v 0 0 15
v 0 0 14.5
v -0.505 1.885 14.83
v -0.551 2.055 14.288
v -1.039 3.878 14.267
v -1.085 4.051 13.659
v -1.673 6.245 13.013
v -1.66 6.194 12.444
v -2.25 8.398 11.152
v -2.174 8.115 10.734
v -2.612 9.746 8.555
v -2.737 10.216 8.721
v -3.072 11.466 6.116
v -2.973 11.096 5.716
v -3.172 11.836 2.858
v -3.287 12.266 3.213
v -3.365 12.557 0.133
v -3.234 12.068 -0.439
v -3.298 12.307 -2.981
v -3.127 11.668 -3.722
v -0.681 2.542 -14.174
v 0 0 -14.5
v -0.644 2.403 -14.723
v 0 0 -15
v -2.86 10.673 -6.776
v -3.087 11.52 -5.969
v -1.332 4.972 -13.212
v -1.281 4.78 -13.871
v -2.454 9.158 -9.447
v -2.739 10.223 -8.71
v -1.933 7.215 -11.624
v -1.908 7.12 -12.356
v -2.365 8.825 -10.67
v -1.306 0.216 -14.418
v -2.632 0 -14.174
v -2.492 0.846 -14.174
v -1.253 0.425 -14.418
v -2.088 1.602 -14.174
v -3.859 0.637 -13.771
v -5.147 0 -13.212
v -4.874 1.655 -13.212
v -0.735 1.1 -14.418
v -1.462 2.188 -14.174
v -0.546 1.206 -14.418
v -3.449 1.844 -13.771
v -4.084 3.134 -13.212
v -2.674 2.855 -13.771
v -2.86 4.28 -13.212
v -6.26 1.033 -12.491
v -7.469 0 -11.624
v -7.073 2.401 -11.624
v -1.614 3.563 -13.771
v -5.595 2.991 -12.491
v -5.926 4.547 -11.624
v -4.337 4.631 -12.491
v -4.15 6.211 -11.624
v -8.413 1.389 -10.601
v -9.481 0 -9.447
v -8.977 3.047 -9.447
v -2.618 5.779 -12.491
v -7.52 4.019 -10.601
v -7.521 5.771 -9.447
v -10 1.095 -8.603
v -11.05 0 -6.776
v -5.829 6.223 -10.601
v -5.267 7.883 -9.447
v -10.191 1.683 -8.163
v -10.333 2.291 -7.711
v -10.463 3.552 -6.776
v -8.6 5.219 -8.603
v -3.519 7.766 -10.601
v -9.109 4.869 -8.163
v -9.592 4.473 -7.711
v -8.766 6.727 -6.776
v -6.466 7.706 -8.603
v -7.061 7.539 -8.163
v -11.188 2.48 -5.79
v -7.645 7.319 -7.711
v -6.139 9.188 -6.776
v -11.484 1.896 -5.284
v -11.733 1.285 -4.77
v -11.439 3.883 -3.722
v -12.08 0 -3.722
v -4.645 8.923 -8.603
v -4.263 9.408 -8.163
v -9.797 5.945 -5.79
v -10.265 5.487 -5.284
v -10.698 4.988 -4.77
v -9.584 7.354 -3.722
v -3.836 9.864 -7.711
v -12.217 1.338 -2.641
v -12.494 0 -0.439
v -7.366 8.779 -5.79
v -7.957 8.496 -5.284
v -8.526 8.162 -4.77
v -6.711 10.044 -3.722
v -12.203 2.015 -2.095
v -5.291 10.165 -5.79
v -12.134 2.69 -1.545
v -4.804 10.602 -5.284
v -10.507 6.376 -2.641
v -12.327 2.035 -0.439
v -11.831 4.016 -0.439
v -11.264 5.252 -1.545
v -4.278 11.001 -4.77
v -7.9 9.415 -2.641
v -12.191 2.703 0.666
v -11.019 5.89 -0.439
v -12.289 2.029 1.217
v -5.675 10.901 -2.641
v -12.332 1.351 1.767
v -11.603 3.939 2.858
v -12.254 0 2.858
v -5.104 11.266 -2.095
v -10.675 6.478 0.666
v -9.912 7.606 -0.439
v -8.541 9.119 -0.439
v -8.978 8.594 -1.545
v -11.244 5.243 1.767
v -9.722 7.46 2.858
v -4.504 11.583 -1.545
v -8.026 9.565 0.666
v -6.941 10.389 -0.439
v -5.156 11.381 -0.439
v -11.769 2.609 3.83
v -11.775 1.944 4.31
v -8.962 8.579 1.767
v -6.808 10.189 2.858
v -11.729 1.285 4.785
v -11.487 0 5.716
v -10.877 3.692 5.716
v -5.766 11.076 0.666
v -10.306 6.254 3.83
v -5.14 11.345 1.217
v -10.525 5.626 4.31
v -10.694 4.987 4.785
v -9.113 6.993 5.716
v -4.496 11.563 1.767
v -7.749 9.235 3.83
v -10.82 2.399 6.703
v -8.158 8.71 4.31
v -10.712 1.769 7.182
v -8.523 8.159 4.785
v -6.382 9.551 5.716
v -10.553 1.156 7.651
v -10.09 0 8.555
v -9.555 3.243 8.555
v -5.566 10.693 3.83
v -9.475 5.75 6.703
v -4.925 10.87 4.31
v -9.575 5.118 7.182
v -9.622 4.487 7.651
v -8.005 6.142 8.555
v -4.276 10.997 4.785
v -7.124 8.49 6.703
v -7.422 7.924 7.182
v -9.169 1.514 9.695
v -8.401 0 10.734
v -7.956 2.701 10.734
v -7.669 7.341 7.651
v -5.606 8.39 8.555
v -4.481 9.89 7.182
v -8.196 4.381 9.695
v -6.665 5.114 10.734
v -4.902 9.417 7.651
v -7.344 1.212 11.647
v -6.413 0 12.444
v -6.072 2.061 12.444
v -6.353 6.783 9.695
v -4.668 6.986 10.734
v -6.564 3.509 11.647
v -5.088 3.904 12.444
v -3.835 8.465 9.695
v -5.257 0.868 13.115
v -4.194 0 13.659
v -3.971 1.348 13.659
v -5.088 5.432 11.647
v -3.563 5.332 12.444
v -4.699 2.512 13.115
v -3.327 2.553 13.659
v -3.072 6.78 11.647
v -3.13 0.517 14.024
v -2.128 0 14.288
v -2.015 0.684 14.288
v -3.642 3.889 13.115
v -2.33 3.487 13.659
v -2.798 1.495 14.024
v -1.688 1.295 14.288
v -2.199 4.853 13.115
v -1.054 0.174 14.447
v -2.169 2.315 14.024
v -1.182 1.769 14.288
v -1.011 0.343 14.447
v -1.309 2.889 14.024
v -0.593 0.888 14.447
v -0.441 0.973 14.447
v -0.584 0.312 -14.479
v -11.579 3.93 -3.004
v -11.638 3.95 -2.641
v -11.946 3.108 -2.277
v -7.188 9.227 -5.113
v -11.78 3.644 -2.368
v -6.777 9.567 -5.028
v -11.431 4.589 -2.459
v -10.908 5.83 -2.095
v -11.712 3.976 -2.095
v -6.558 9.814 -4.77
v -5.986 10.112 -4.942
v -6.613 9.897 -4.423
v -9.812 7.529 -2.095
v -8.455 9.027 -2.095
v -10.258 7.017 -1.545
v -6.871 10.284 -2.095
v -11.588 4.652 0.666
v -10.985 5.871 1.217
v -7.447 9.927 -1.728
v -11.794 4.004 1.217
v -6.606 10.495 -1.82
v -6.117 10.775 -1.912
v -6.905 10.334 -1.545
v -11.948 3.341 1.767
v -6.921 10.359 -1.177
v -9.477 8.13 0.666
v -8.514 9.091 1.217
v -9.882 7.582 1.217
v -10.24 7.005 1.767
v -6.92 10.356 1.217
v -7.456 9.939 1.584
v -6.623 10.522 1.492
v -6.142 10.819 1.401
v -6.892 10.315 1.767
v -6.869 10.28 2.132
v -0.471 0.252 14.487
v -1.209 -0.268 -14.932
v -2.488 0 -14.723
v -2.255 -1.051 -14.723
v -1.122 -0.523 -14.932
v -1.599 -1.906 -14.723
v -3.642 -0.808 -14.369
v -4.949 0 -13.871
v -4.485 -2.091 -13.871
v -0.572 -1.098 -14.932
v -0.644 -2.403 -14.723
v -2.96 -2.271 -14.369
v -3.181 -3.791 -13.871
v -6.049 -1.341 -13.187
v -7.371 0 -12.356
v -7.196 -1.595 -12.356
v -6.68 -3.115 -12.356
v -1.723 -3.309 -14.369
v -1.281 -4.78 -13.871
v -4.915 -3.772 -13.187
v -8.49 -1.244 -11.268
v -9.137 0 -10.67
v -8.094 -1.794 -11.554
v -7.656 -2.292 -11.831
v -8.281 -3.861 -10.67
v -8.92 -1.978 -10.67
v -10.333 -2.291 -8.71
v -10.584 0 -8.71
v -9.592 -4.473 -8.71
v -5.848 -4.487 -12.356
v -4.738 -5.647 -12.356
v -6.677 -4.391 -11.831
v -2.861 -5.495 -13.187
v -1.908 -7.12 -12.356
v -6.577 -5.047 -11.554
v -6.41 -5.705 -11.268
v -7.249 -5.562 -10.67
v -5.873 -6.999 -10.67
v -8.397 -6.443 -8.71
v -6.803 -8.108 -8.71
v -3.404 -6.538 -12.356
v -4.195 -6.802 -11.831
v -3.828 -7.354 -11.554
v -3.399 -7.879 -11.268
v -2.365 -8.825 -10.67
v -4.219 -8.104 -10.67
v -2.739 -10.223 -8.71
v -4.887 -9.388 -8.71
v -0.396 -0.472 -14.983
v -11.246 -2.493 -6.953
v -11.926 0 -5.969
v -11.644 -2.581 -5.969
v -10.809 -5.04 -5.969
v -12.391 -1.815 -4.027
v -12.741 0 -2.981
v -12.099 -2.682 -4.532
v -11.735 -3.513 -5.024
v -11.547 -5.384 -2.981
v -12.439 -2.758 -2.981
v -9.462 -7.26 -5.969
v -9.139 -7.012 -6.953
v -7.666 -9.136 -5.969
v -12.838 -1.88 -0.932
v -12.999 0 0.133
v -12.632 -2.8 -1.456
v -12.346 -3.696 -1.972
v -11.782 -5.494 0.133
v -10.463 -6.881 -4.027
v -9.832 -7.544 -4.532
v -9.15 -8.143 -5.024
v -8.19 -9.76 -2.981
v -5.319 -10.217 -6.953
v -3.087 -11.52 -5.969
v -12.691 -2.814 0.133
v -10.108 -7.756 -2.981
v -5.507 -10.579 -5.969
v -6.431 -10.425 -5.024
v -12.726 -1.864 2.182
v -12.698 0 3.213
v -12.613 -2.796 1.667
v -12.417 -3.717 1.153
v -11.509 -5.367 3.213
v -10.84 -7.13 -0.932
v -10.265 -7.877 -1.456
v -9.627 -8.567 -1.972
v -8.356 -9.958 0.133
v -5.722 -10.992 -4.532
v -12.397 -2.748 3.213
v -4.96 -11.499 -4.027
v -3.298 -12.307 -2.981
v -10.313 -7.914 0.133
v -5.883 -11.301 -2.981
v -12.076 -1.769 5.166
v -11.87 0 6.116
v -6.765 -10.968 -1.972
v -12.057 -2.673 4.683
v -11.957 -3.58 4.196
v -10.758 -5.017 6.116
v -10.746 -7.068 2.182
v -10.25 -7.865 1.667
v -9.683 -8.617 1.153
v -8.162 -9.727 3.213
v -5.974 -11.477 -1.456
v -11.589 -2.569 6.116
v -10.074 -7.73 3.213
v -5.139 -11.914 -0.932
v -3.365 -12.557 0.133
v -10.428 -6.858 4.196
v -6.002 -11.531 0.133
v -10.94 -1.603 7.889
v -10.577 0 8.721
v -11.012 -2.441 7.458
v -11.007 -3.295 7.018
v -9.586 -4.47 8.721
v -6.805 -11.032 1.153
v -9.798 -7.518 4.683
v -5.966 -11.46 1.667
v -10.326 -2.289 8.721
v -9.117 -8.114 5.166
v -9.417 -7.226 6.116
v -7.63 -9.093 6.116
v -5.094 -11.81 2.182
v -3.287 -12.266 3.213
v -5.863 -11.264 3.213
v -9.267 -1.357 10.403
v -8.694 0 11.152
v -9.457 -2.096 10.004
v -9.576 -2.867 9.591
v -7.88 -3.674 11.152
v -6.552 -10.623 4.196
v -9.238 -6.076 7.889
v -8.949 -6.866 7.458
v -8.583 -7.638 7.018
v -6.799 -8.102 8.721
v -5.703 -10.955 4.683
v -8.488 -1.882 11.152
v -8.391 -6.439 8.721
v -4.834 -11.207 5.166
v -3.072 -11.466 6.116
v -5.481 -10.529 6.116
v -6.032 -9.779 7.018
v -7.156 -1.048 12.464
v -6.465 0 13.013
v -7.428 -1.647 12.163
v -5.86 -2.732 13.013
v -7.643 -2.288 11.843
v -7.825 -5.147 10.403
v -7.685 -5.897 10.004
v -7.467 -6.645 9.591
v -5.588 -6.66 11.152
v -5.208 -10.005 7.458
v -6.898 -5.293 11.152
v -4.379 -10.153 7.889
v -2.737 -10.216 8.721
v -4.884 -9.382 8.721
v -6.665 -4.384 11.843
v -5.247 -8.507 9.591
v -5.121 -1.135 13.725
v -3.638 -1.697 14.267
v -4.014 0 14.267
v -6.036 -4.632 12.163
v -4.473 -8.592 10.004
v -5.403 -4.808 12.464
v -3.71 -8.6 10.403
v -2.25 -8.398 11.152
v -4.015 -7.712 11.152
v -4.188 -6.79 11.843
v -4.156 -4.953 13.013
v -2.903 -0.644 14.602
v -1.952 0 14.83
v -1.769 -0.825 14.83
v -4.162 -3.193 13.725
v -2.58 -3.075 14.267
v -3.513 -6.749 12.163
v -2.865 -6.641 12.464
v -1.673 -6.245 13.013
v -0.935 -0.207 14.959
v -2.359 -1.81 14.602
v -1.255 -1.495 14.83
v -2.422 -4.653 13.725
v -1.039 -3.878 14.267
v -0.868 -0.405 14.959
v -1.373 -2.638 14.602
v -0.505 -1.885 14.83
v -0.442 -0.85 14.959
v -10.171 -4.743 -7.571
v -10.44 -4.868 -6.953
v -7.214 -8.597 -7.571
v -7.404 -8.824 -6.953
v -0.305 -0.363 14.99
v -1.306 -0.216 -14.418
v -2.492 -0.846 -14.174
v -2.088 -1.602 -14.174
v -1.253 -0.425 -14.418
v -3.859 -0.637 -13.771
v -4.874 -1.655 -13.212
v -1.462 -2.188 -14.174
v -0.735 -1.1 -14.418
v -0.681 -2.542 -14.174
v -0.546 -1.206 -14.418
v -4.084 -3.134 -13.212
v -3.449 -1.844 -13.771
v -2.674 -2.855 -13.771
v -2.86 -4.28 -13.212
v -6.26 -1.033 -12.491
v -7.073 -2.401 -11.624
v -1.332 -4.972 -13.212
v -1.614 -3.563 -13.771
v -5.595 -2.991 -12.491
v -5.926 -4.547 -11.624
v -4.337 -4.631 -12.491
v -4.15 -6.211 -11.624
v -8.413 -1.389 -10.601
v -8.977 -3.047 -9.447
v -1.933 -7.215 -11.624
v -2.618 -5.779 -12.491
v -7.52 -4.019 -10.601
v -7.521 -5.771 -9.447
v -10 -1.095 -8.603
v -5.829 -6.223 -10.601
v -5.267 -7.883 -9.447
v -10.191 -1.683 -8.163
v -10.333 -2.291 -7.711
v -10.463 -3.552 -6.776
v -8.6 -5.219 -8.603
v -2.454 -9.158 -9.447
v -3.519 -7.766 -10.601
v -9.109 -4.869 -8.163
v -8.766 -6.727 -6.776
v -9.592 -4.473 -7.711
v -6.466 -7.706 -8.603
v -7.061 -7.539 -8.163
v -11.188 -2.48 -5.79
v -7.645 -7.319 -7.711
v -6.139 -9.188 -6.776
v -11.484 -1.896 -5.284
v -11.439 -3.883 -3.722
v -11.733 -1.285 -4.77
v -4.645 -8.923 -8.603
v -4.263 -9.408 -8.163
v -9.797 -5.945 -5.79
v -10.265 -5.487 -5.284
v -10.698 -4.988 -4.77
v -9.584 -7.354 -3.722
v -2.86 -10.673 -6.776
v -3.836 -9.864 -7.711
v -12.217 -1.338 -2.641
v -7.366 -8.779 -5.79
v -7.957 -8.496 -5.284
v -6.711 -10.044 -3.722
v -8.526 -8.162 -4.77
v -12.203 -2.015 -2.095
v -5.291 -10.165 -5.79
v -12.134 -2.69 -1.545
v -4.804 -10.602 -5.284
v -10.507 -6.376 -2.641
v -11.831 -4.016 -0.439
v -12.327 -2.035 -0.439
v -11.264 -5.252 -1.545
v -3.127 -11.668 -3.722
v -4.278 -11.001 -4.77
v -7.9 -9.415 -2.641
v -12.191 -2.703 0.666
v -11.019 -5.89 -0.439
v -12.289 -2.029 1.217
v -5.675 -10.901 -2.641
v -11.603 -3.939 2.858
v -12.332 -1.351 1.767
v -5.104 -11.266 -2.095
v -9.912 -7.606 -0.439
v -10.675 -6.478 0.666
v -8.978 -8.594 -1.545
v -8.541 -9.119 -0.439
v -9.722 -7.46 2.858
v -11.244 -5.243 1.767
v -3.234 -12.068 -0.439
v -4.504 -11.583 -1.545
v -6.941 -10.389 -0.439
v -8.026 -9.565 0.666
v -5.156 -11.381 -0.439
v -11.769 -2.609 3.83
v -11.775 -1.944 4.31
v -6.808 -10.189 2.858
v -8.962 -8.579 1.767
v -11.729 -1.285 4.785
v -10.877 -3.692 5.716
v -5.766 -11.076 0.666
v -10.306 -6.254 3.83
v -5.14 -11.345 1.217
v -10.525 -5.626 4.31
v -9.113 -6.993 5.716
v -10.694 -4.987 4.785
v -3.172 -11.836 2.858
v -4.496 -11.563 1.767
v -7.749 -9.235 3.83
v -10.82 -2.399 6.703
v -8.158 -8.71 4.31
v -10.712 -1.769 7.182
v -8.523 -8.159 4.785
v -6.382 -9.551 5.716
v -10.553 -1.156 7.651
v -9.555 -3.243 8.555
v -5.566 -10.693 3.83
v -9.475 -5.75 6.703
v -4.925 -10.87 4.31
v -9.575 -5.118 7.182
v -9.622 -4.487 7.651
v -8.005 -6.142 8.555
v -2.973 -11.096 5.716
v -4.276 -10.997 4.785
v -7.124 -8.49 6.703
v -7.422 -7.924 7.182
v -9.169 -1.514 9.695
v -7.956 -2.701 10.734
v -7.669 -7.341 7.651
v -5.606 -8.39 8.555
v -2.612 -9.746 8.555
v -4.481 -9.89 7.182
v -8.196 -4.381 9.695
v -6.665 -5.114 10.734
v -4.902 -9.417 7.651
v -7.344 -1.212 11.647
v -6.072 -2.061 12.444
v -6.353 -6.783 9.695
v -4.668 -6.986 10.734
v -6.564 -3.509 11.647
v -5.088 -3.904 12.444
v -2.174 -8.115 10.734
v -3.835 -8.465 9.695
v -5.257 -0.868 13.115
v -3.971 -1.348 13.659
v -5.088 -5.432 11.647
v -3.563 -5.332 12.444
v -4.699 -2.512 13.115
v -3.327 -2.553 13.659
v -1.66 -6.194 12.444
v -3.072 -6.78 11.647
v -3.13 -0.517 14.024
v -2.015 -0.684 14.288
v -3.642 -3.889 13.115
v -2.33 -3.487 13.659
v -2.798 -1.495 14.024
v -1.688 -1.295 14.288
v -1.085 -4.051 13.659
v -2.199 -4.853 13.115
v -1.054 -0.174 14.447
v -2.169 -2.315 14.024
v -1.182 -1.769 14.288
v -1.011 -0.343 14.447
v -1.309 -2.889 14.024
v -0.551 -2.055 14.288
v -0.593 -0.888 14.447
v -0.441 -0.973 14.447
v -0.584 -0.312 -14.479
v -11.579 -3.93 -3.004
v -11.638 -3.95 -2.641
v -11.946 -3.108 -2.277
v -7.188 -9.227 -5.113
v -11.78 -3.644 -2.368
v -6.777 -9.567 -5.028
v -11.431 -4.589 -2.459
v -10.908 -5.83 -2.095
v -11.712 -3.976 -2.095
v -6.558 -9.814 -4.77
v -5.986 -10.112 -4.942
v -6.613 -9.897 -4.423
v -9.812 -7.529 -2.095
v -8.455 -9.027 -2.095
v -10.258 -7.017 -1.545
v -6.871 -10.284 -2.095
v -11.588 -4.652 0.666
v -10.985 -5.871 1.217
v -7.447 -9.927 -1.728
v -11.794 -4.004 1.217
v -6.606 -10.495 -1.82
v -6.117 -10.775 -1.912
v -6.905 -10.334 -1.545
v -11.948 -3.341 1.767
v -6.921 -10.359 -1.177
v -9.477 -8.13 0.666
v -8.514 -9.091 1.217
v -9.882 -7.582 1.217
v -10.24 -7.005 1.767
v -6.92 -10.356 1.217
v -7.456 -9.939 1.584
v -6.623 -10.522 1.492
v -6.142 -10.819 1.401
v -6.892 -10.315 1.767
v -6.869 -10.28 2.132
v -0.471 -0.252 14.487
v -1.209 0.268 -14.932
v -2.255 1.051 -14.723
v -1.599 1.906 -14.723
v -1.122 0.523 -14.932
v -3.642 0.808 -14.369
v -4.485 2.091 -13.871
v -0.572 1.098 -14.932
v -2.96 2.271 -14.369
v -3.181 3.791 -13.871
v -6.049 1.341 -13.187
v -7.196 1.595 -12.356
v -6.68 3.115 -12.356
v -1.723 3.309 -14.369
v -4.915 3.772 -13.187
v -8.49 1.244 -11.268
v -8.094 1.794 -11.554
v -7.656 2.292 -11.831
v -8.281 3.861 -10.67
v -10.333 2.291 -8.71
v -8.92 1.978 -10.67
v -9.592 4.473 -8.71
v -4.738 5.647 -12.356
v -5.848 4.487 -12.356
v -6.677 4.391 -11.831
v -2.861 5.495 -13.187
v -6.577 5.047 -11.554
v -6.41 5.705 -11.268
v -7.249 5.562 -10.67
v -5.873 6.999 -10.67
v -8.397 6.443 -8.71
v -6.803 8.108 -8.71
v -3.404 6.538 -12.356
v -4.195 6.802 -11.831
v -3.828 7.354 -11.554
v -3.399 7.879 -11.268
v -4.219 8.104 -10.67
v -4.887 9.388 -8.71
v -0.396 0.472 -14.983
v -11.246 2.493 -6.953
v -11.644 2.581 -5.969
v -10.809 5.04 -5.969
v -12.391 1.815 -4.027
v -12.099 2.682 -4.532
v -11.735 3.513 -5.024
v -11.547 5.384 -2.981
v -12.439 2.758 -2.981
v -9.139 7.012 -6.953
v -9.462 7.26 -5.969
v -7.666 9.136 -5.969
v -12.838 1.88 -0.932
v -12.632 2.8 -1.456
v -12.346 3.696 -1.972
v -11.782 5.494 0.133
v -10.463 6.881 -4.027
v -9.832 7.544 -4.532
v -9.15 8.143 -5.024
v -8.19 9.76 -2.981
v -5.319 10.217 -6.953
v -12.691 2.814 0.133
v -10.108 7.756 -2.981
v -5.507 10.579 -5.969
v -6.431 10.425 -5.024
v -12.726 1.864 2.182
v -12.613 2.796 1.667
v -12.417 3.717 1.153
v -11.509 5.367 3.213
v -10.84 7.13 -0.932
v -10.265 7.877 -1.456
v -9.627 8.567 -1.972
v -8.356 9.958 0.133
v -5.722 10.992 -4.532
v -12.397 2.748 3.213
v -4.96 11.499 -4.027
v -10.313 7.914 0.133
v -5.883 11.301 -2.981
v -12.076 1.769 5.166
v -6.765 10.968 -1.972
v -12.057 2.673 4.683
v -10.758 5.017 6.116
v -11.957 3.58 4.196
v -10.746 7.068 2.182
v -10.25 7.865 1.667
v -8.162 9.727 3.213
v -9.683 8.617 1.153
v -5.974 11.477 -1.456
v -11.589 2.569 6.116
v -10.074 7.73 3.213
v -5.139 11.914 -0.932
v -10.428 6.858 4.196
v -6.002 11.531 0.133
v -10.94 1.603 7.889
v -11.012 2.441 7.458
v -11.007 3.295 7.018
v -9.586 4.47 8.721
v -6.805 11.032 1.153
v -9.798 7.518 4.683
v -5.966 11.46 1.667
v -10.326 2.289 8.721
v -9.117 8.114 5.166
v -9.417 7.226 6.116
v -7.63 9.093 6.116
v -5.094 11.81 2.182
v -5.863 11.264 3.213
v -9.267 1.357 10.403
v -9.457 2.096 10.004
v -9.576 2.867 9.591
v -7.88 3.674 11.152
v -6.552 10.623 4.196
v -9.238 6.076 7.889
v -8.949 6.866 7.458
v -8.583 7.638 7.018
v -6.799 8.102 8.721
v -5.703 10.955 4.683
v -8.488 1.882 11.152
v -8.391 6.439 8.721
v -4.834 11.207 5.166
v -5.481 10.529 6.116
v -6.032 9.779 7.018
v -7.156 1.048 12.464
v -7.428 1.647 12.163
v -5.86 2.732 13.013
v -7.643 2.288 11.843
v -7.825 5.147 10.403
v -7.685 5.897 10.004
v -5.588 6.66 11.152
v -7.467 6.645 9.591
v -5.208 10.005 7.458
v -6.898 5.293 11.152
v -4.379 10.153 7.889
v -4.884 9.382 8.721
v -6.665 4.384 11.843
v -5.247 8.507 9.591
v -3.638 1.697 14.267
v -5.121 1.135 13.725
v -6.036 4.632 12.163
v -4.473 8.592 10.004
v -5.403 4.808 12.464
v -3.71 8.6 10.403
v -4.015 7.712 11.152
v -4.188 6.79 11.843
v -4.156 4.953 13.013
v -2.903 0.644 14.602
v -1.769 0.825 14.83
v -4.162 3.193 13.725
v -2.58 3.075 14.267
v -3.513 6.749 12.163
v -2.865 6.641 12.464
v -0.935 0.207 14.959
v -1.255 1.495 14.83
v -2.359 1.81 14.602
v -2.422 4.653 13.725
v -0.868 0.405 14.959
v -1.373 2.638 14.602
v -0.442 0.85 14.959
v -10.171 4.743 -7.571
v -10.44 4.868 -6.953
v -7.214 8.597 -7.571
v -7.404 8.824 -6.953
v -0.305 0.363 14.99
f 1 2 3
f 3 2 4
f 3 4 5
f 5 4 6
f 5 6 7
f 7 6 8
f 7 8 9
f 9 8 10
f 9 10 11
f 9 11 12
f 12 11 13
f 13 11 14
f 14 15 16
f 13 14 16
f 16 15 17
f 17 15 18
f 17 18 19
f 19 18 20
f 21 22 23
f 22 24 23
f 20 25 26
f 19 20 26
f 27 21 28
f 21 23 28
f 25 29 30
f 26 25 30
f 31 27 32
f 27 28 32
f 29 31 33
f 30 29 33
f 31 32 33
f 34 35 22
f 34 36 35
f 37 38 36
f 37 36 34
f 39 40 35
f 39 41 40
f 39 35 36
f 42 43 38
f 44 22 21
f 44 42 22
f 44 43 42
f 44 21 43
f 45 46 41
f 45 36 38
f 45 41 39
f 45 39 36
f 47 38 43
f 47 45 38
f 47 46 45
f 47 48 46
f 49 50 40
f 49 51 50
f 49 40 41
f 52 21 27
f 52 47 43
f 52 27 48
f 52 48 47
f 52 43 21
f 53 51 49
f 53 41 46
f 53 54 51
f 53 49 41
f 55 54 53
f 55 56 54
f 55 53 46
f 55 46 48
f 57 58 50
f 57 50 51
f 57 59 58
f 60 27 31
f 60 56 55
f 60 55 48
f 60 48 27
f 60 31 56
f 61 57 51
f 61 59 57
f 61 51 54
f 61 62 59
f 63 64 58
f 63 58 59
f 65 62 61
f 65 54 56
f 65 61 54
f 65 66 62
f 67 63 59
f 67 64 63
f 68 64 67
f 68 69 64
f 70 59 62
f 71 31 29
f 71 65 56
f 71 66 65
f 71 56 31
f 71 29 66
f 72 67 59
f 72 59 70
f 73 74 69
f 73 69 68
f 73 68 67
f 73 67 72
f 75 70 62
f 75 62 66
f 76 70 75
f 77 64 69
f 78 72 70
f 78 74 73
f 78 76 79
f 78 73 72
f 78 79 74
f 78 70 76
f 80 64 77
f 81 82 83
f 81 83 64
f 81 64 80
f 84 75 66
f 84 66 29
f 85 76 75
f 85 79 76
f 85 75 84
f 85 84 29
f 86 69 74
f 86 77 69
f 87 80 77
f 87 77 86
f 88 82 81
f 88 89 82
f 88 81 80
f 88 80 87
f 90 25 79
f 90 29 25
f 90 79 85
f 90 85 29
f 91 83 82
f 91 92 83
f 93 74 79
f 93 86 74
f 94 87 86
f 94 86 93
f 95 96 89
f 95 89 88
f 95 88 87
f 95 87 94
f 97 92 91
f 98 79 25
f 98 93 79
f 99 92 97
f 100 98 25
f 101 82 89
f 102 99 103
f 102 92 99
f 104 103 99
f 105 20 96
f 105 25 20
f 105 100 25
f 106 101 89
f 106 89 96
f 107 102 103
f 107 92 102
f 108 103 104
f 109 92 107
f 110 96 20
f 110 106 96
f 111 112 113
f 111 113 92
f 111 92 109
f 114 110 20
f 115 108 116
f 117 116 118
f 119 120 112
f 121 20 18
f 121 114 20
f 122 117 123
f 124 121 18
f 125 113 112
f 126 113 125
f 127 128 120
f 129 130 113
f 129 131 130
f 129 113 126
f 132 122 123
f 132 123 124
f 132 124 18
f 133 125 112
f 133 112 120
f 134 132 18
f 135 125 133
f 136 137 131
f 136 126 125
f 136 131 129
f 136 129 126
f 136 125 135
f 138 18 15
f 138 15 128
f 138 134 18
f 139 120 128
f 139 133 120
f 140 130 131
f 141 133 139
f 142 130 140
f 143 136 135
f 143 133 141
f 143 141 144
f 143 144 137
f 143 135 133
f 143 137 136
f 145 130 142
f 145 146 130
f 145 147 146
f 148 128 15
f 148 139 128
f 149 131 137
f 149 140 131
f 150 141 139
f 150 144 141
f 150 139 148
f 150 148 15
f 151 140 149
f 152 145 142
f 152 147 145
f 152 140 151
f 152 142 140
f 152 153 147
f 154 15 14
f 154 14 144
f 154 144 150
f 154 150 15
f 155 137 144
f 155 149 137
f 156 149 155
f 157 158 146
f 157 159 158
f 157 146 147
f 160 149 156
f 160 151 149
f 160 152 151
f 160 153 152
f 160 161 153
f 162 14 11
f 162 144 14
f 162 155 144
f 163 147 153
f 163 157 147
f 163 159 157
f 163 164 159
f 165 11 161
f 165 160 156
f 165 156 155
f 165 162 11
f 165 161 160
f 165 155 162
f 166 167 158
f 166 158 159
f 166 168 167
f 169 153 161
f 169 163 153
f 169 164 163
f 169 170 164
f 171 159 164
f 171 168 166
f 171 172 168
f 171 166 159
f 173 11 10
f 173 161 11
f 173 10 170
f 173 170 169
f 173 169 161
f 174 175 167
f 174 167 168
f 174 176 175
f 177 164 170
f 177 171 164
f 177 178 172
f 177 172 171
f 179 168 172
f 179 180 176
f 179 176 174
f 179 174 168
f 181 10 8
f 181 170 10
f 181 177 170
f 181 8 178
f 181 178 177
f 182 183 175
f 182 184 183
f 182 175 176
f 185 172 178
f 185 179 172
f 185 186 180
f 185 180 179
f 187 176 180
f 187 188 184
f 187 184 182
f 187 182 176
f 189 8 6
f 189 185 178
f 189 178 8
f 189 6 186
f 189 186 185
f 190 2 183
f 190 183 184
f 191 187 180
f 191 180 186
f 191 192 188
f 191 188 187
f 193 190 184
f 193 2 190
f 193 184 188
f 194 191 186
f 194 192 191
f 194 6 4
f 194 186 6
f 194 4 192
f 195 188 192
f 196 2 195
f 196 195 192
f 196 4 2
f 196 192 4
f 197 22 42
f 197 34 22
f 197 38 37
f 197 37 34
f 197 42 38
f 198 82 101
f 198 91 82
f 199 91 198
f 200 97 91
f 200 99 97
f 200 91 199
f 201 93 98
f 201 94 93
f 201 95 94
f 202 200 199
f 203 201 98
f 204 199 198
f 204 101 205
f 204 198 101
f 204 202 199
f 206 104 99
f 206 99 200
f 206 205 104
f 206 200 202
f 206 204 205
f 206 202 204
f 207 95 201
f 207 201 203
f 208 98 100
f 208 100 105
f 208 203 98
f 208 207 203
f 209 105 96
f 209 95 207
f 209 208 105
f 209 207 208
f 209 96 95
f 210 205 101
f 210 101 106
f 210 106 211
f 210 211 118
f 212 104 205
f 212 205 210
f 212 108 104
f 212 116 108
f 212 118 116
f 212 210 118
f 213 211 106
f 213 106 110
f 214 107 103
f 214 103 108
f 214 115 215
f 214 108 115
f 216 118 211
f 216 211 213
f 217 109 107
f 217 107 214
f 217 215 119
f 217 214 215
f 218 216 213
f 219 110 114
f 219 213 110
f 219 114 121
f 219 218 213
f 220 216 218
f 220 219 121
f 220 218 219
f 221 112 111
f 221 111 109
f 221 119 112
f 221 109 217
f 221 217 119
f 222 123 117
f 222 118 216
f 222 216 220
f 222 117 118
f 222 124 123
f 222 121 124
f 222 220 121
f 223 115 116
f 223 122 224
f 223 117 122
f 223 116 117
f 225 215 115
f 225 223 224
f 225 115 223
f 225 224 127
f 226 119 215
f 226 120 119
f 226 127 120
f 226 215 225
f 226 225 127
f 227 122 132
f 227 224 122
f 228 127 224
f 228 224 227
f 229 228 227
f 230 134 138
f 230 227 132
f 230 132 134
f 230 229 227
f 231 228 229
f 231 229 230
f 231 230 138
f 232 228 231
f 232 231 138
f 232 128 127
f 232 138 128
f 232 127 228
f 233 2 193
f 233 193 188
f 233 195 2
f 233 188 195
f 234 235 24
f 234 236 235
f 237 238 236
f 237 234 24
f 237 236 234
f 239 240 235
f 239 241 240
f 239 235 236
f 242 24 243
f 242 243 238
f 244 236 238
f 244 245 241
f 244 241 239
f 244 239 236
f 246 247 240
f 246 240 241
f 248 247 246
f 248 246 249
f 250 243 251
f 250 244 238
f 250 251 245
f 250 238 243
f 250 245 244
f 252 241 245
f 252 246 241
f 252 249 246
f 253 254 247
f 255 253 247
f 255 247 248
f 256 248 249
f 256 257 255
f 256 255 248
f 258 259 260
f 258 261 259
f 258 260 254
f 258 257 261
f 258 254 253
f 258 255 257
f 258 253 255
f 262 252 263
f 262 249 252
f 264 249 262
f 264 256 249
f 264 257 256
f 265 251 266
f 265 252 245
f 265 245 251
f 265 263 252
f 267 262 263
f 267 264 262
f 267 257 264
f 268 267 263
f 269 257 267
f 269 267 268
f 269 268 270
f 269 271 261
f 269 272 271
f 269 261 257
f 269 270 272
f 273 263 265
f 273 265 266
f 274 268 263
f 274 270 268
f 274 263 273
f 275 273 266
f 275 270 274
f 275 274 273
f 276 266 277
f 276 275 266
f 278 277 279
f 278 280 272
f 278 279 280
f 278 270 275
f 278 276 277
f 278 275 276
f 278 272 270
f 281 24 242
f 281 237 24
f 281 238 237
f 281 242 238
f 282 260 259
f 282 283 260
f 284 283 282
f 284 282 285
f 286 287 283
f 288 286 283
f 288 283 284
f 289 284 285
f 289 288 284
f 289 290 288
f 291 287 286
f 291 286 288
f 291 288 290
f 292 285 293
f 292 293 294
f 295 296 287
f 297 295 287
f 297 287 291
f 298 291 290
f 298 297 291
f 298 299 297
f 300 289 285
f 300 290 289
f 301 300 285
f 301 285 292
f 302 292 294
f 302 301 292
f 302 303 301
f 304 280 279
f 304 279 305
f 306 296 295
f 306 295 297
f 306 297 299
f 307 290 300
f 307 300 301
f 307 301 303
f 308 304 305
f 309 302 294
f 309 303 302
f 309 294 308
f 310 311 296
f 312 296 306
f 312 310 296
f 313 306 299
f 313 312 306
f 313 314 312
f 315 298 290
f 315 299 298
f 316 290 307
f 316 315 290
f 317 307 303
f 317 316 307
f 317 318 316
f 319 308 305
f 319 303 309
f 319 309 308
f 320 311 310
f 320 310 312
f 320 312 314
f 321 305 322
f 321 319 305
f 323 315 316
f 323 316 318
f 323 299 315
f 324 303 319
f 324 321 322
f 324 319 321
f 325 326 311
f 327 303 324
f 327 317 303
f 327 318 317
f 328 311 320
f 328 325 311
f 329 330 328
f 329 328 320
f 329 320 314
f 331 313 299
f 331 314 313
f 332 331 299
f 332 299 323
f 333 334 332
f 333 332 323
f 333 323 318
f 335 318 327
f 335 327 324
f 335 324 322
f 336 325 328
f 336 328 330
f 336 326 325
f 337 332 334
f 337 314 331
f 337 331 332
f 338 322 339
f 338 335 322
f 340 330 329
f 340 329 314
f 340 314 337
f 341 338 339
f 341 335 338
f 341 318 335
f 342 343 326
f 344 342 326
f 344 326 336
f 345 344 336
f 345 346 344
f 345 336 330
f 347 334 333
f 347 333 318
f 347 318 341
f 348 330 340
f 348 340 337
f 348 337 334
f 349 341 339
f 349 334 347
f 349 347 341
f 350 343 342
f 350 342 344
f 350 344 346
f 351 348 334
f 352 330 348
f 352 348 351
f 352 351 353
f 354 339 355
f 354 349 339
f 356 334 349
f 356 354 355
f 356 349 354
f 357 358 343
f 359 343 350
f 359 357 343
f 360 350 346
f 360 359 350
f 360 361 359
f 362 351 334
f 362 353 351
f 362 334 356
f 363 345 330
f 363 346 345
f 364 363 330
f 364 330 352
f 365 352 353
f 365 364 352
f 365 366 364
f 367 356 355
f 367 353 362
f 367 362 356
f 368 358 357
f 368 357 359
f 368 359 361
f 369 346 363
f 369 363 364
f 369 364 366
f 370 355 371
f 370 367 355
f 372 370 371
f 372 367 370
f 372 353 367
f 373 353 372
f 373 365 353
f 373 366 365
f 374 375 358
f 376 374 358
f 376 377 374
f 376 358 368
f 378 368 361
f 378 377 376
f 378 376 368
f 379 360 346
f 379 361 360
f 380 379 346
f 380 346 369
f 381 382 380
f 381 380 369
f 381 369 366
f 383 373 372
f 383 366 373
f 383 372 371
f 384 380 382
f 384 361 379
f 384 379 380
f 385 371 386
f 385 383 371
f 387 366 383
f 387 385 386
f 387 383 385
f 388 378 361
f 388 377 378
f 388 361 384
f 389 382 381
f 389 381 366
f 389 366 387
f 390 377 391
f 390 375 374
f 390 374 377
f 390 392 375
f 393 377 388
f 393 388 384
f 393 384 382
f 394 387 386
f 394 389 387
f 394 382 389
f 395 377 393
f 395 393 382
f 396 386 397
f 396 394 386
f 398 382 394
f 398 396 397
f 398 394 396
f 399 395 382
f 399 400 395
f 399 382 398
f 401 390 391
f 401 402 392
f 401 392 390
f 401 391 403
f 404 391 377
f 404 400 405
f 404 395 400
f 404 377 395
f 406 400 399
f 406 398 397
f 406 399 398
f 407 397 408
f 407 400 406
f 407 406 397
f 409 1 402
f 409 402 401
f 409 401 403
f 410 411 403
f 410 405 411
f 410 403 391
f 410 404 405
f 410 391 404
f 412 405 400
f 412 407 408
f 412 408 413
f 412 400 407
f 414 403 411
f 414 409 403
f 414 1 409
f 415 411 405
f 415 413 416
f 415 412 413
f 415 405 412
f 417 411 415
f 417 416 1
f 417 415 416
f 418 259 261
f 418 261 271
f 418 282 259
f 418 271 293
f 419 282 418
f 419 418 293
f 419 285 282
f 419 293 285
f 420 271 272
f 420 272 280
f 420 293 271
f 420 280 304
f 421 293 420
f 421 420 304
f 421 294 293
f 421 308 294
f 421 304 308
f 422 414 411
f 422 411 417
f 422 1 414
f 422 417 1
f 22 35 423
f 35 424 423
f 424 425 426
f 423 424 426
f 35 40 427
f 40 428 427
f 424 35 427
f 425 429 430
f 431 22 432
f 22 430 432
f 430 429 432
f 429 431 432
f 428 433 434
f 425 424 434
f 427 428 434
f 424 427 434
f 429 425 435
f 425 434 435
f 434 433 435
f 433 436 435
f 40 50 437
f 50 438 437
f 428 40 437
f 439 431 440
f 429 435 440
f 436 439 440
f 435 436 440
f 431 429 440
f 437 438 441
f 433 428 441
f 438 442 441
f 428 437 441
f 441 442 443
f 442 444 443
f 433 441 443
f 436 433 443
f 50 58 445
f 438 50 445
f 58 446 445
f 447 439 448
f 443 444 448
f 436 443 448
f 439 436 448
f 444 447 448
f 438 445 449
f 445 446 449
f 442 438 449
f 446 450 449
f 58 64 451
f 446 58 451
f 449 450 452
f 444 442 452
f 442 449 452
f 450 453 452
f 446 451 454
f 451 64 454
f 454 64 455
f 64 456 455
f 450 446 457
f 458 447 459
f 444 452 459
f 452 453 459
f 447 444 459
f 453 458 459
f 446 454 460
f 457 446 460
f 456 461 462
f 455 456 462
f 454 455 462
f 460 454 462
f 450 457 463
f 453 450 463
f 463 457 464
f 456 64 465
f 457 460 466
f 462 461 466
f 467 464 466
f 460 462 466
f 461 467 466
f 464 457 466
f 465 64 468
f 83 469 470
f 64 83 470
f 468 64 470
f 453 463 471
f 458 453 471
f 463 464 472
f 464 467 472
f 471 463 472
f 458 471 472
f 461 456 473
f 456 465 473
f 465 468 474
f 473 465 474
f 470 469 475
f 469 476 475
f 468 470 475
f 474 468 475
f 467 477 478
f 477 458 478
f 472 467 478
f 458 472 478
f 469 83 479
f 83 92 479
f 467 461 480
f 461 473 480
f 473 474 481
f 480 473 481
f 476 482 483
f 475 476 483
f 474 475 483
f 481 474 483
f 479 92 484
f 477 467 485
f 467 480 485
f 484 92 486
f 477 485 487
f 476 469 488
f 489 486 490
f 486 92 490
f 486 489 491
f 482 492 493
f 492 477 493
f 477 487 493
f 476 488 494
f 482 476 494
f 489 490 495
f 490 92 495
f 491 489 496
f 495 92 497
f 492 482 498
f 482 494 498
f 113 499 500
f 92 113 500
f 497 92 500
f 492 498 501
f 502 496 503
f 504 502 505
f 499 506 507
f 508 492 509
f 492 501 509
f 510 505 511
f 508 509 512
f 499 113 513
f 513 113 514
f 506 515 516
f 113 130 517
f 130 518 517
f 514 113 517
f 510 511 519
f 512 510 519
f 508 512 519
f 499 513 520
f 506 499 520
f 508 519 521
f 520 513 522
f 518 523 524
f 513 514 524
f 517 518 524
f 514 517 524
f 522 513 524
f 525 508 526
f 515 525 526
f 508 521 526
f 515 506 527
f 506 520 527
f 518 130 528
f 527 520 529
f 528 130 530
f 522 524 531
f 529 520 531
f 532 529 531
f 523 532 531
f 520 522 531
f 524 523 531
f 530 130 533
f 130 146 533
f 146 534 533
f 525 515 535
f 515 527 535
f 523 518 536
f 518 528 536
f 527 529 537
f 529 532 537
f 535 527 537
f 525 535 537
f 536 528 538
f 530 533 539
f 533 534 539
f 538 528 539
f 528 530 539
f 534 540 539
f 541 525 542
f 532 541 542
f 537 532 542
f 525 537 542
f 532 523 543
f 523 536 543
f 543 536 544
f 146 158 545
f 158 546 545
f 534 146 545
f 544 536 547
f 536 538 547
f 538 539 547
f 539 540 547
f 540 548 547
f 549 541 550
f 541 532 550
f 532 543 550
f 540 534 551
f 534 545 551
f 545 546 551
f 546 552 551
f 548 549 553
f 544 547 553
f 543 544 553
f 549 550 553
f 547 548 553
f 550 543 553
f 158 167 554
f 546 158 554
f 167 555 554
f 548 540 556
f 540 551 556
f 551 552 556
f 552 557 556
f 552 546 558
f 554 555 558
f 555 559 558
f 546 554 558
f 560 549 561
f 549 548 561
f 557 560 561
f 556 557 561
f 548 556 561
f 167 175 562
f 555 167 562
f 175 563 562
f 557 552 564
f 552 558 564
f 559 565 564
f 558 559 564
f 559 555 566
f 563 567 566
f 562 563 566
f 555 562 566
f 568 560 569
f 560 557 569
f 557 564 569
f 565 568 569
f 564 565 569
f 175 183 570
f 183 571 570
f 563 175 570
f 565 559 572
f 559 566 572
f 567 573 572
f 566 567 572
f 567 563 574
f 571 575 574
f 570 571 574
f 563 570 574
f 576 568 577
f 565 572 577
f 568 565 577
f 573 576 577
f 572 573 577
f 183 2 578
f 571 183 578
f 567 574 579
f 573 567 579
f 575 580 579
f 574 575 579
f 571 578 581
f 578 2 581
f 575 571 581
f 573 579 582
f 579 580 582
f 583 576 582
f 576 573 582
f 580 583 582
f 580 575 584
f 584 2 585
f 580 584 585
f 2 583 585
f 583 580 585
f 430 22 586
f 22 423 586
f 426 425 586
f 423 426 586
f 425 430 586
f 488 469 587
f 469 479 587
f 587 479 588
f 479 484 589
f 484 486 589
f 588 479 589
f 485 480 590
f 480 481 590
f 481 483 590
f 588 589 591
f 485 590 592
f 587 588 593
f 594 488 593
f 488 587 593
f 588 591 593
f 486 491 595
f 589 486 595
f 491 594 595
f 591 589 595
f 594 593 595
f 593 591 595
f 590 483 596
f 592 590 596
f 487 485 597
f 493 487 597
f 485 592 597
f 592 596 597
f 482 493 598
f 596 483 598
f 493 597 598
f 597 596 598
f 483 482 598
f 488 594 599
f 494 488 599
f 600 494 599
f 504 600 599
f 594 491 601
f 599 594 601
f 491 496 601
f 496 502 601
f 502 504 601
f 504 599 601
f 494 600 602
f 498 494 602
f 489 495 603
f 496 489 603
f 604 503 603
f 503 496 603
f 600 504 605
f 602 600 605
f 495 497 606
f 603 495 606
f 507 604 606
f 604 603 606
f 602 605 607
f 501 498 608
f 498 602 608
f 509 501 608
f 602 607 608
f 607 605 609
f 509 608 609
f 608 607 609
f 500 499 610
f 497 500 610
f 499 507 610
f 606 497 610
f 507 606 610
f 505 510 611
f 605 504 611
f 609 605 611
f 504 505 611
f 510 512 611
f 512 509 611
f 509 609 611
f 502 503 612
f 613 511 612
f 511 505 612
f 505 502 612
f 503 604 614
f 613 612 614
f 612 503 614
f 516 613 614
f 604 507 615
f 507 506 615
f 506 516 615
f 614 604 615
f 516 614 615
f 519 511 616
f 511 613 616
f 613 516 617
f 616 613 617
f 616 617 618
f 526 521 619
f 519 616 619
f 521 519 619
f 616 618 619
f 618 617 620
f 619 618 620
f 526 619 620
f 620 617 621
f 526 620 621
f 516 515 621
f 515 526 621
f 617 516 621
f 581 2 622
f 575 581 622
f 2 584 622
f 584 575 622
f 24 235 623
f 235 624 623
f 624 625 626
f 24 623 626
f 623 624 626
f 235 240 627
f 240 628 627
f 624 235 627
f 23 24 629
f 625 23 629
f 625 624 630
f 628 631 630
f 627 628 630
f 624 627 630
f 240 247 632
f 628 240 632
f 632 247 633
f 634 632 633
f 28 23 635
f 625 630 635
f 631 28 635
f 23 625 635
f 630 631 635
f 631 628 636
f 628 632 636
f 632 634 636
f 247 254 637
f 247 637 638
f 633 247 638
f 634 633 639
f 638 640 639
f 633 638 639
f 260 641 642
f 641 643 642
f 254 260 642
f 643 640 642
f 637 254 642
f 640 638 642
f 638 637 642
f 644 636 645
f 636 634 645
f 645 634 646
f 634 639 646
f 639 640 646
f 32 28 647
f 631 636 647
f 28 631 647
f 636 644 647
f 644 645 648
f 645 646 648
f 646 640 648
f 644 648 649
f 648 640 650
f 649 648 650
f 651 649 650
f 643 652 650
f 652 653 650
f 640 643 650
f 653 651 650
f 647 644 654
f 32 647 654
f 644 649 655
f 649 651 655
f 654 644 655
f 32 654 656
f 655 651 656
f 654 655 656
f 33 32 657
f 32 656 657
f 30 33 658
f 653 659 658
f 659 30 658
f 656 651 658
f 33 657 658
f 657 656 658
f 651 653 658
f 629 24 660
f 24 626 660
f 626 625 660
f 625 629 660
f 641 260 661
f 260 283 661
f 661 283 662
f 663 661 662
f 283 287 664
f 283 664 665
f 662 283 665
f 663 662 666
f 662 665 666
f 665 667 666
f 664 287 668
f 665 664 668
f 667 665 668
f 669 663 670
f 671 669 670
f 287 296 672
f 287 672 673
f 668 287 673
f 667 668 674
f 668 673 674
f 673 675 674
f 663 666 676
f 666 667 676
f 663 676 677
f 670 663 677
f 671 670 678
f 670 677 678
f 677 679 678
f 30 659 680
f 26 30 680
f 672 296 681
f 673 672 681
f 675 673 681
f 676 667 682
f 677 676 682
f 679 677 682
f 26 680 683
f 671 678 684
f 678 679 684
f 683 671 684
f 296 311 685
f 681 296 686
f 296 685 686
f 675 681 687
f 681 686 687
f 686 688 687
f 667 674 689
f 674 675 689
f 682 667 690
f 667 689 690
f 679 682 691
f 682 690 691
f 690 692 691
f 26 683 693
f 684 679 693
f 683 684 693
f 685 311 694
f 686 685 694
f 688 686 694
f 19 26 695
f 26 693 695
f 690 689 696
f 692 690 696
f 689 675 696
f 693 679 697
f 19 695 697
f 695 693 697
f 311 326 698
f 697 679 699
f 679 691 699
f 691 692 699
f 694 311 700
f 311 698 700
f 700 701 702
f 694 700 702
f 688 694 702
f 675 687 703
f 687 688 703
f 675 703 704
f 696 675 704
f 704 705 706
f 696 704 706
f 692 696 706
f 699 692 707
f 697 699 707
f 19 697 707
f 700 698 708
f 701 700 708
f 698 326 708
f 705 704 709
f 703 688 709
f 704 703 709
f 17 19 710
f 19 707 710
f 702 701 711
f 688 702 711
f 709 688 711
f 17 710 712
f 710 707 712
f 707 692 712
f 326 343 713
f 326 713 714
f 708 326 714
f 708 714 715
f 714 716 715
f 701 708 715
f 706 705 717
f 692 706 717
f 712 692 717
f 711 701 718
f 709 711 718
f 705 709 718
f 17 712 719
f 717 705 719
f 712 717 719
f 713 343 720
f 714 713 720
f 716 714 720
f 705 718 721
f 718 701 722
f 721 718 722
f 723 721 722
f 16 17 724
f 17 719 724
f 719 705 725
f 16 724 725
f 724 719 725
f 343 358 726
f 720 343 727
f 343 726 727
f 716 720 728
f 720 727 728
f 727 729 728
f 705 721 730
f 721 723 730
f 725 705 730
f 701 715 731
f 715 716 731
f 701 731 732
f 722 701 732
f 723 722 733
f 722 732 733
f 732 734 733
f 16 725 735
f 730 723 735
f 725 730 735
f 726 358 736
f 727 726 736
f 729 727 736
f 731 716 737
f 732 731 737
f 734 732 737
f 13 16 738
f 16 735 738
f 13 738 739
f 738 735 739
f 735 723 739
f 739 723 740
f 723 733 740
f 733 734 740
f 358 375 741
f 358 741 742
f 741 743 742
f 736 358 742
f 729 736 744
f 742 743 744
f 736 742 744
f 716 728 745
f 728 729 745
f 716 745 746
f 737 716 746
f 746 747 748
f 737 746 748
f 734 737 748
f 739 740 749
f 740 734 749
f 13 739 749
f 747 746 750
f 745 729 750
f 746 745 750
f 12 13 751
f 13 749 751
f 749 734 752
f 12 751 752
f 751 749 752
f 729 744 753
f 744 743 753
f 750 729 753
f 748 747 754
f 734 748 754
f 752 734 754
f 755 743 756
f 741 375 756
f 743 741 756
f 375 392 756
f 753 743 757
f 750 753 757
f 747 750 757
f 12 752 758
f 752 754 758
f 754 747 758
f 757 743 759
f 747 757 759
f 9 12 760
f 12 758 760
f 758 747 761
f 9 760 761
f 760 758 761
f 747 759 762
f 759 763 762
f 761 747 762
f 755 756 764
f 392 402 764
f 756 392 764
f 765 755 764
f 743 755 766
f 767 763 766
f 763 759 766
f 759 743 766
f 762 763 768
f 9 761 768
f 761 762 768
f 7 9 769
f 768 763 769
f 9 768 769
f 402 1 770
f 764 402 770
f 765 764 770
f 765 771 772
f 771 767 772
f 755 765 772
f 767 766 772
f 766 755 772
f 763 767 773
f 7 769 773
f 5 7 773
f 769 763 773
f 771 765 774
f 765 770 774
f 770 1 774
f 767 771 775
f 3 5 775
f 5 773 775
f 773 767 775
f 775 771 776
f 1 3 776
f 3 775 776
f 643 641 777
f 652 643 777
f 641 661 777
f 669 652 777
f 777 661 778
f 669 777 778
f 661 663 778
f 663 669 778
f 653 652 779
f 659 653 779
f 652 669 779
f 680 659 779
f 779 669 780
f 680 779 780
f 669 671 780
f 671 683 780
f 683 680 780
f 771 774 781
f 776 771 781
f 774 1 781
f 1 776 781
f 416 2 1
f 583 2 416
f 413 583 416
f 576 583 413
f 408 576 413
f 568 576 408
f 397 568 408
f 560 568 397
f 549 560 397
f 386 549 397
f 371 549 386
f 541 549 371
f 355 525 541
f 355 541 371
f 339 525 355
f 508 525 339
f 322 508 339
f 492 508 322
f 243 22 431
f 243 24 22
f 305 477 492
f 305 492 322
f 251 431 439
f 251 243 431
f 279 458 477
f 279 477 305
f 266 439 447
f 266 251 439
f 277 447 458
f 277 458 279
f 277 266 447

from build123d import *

# Parameters (mm, degrees)
REVOLVE2_ANGLE           = 75
REVOLVE2_OTHER_WAY_ANGLE = 75


with BuildPart() as part:
    # Sketch4 → Revolve2 (revolve)
    with BuildSketch(Plane(origin=(0, 0, 0), x_dir=(1, 0, 0), z_dir=(0, 1, 0))):
        with BuildLine():
            add(Edge.make_bspline(
                [(0, 14.5), (-1.627718152, 14.5), (-4.877775506, 13.754945412), (-9.041859421, 10.55010702), (-11.842048496, 5.719445199), (-12.828975752, 0), (-11.842048496, -5.719445199), (-9.041859421, -10.55010702), (-4.877775506, -13.754945412), (-1.627718152, -14.5), (0, -14.5)],
                knots=[0, 0, 0, 0, 0.392699082, 0.785398163, 1.178097245, 1.570796327, 1.963495408, 2.35619449, 2.748893572, 3.141592654, 3.141592654, 3.141592654, 3.141592654], degree=3))
            Line((0, -14.5), (0, -15))
            add(Edge.make_bspline(
                [(-10.583663309, 8.710282968), (-25.240396162, -15), (0, -15)],
                knots=[0.951225845, 0.951225845, 0.951225845, 3.141592654, 3.141592654, 3.141592654], degree=2, weights=[1, 0.457883429, 1]))
            add(Edge.make_bspline(
                [(0, 15), (-6.695615985, 15), (-10.583663309, 8.710282968)],
                knots=[3.141592654, 3.141592654, 3.141592654, 4.092818499, 4.092818499, 4.092818499], degree=2, weights=[1, 0.889012242, 1]))
            Line((0, 15), (0, 14.5))
        make_face()
    revolve(axis=Axis((0, 0, -15), (0, 0, 1)), revolution_arc=REVOLVE2_ANGLE)

    # Sketch4 → Revolve2 other way (revolve)
    with BuildSketch(Plane(origin=(0, 0, 0), x_dir=(1, 0, 0), z_dir=(0, 1, 0))):
        with BuildLine():
            add(Edge.make_bspline(
                [(0, 14.5), (-1.627718152, 14.5), (-4.877775506, 13.754945412), (-9.041859421, 10.55010702), (-11.842048496, 5.719445199), (-12.828975752, 0), (-11.842048496, -5.719445199), (-9.041859421, -10.55010702), (-4.877775506, -13.754945412), (-1.627718152, -14.5), (0, -14.5)],
                knots=[0, 0, 0, 0, 0.392699082, 0.785398163, 1.178097245, 1.570796327, 1.963495408, 2.35619449, 2.748893572, 3.141592654, 3.141592654, 3.141592654, 3.141592654], degree=3))
            Line((0, -14.5), (0, -15))
            add(Edge.make_bspline(
                [(-10.583663309, 8.710282968), (-25.240396162, -15), (0, -15)],
                knots=[0.951225845, 0.951225845, 0.951225845, 3.141592654, 3.141592654, 3.141592654], degree=2, weights=[1, 0.457883429, 1]))
            add(Edge.make_bspline(
                [(0, 15), (-6.695615985, 15), (-10.583663309, 8.710282968)],
                knots=[3.141592654, 3.141592654, 3.141592654, 4.092818499, 4.092818499, 4.092818499], degree=2, weights=[1, 0.889012242, 1]))
            Line((0, 15), (0, 14.5))
        make_face()
    revolve(axis=Axis((0, 0, -15), (0, 0, -1)), revolution_arc=REVOLVE2_OTHER_WAY_ANGLE)


solid = part.part
